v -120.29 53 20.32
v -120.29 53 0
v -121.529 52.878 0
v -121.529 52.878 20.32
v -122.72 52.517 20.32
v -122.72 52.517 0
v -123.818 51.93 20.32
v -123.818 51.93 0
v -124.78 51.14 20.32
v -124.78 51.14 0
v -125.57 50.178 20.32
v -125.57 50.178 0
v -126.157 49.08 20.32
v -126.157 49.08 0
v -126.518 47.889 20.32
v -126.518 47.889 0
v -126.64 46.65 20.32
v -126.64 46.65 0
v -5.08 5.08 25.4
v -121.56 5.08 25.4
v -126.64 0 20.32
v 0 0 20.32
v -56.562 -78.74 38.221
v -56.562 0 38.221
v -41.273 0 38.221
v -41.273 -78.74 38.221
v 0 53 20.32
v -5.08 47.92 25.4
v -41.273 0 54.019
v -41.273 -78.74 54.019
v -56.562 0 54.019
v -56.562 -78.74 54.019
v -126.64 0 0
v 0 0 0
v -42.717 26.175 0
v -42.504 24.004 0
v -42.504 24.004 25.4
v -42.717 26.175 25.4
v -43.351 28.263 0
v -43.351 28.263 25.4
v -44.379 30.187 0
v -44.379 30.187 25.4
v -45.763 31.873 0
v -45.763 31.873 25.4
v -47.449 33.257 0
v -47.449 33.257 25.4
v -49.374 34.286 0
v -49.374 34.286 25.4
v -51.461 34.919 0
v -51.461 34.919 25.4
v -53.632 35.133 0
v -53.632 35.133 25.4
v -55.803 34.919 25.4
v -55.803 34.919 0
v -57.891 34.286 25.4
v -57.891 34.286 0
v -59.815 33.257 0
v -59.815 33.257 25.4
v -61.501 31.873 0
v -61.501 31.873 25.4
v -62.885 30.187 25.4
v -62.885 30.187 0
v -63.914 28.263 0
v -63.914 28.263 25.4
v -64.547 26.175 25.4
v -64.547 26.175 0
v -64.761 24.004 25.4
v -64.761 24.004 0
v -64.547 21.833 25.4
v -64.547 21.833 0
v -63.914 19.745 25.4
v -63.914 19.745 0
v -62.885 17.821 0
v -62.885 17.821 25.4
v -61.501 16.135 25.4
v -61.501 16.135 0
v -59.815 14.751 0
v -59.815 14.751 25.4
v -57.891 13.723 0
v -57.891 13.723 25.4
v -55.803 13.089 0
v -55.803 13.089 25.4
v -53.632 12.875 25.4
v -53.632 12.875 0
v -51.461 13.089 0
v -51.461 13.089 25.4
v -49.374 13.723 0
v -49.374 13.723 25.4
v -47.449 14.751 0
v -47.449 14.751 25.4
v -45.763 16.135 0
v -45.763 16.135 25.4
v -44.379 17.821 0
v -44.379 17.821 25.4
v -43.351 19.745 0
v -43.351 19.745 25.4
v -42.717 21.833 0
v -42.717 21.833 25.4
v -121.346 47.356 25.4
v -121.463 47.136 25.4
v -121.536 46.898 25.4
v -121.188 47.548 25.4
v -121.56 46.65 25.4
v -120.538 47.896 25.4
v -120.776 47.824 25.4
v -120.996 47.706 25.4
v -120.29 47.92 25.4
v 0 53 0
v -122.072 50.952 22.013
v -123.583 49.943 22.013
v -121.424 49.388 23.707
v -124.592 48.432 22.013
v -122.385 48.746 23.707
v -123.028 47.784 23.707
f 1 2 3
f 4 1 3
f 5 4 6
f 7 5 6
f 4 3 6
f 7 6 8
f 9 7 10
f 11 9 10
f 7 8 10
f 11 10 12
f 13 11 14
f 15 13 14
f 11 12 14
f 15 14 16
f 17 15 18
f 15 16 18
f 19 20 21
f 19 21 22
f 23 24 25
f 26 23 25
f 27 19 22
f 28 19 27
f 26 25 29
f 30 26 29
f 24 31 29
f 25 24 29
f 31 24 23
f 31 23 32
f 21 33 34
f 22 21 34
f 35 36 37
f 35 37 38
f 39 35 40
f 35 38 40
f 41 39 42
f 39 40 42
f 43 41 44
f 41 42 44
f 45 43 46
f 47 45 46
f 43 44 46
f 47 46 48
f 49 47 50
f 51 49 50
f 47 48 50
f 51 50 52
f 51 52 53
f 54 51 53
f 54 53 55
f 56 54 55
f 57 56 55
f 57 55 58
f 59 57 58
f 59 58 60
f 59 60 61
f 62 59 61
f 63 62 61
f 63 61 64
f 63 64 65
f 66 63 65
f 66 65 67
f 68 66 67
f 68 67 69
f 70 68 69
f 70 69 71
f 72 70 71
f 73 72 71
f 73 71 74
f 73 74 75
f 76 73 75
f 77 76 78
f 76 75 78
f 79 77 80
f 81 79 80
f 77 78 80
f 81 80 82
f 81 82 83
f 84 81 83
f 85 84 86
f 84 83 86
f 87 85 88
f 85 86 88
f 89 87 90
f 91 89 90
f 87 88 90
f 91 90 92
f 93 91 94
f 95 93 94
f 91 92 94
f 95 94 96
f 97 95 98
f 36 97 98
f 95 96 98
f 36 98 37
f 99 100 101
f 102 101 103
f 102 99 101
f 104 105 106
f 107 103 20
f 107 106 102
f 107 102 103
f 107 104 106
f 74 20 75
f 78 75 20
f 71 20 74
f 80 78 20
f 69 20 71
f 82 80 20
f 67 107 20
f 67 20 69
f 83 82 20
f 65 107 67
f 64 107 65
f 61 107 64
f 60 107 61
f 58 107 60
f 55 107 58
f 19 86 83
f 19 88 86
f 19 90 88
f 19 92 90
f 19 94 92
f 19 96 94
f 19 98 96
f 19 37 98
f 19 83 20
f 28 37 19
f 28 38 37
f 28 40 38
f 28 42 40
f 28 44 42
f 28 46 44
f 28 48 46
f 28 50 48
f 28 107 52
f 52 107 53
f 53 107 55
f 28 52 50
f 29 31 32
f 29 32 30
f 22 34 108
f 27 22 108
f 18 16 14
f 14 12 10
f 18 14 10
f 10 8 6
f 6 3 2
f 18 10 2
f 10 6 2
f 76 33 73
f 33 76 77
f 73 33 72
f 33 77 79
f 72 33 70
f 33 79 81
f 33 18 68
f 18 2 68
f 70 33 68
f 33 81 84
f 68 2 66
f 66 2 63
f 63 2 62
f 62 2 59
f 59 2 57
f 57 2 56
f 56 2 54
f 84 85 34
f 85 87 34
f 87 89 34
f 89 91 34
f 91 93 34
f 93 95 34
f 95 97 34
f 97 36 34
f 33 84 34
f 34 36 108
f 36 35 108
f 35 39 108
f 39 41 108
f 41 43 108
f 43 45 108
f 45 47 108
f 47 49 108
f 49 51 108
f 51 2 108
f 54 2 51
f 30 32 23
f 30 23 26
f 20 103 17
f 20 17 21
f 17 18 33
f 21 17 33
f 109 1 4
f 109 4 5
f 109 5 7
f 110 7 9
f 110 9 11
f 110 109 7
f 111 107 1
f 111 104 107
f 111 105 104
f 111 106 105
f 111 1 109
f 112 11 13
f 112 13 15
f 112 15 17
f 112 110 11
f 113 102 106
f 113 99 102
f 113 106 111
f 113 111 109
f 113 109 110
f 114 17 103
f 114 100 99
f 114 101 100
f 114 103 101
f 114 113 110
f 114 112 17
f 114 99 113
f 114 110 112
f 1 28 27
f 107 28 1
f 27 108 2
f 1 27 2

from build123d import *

# Parameters (mm, degrees)
F1_DEPTH      = 25.4
F2_SIZE       = 5.08
F3_R          = 11.12869
F4_DEPTH      = 72.136
F4_DEPTH_BACK = 25.4
F5_W          = 15.288536
F5_H          = 15.798151
F6_DEPTH      = 78.74


with BuildPart() as f1:
    # F0 (on Top) → F1 (new body)
    with BuildSketch(Plane.XY):
        with BuildLine():
            Line((-126.640037, 0), (0, 0))
            Line((0, 0), (0, 53.000256))
            Line((0, 53.000256), (-120.290037, 53.000256))
            ThreePointArc((-120.290037, 53.000256), (-124.780165, 51.140384), (-126.640037, 46.650256))
            Line((-126.640037, 46.650256), (-126.640037, 0))
        make_face()
    extrude(amount=F1_DEPTH)

    # F2
    f2_edges = [f1.edges().sort_by_distance(p)[0] for p in [
        (-126.640037, 23.325128, 25.4),
        (-63.320018, 0, 25.4),
        (0, 26.500128, 25.4),
    ]]
    chamfer(f2_edges, length=F2_SIZE)

    # F3 (on face) → F4 (cut, two sides)
    with BuildSketch(Plane.XY.offset(25.4)) as f4_sk:
        with Locations((-53.632267, 24.004094)):
            Circle(F3_R)
    extrude(amount=-F4_DEPTH, mode=Mode.SUBTRACT)
    extrude(f4_sk.sketch, amount=-F4_DEPTH_BACK, mode=Mode.SUBTRACT)


with BuildPart() as f6:
    # F5 (on face) → F6 (new body)
    with BuildSketch(Plane.XZ):
        with Locations((-48.917247, 46.120413)):
            Rectangle(F5_W, F5_H)
    extrude(amount=F6_DEPTH)


solid = Compound([f1.part, f6.part])
